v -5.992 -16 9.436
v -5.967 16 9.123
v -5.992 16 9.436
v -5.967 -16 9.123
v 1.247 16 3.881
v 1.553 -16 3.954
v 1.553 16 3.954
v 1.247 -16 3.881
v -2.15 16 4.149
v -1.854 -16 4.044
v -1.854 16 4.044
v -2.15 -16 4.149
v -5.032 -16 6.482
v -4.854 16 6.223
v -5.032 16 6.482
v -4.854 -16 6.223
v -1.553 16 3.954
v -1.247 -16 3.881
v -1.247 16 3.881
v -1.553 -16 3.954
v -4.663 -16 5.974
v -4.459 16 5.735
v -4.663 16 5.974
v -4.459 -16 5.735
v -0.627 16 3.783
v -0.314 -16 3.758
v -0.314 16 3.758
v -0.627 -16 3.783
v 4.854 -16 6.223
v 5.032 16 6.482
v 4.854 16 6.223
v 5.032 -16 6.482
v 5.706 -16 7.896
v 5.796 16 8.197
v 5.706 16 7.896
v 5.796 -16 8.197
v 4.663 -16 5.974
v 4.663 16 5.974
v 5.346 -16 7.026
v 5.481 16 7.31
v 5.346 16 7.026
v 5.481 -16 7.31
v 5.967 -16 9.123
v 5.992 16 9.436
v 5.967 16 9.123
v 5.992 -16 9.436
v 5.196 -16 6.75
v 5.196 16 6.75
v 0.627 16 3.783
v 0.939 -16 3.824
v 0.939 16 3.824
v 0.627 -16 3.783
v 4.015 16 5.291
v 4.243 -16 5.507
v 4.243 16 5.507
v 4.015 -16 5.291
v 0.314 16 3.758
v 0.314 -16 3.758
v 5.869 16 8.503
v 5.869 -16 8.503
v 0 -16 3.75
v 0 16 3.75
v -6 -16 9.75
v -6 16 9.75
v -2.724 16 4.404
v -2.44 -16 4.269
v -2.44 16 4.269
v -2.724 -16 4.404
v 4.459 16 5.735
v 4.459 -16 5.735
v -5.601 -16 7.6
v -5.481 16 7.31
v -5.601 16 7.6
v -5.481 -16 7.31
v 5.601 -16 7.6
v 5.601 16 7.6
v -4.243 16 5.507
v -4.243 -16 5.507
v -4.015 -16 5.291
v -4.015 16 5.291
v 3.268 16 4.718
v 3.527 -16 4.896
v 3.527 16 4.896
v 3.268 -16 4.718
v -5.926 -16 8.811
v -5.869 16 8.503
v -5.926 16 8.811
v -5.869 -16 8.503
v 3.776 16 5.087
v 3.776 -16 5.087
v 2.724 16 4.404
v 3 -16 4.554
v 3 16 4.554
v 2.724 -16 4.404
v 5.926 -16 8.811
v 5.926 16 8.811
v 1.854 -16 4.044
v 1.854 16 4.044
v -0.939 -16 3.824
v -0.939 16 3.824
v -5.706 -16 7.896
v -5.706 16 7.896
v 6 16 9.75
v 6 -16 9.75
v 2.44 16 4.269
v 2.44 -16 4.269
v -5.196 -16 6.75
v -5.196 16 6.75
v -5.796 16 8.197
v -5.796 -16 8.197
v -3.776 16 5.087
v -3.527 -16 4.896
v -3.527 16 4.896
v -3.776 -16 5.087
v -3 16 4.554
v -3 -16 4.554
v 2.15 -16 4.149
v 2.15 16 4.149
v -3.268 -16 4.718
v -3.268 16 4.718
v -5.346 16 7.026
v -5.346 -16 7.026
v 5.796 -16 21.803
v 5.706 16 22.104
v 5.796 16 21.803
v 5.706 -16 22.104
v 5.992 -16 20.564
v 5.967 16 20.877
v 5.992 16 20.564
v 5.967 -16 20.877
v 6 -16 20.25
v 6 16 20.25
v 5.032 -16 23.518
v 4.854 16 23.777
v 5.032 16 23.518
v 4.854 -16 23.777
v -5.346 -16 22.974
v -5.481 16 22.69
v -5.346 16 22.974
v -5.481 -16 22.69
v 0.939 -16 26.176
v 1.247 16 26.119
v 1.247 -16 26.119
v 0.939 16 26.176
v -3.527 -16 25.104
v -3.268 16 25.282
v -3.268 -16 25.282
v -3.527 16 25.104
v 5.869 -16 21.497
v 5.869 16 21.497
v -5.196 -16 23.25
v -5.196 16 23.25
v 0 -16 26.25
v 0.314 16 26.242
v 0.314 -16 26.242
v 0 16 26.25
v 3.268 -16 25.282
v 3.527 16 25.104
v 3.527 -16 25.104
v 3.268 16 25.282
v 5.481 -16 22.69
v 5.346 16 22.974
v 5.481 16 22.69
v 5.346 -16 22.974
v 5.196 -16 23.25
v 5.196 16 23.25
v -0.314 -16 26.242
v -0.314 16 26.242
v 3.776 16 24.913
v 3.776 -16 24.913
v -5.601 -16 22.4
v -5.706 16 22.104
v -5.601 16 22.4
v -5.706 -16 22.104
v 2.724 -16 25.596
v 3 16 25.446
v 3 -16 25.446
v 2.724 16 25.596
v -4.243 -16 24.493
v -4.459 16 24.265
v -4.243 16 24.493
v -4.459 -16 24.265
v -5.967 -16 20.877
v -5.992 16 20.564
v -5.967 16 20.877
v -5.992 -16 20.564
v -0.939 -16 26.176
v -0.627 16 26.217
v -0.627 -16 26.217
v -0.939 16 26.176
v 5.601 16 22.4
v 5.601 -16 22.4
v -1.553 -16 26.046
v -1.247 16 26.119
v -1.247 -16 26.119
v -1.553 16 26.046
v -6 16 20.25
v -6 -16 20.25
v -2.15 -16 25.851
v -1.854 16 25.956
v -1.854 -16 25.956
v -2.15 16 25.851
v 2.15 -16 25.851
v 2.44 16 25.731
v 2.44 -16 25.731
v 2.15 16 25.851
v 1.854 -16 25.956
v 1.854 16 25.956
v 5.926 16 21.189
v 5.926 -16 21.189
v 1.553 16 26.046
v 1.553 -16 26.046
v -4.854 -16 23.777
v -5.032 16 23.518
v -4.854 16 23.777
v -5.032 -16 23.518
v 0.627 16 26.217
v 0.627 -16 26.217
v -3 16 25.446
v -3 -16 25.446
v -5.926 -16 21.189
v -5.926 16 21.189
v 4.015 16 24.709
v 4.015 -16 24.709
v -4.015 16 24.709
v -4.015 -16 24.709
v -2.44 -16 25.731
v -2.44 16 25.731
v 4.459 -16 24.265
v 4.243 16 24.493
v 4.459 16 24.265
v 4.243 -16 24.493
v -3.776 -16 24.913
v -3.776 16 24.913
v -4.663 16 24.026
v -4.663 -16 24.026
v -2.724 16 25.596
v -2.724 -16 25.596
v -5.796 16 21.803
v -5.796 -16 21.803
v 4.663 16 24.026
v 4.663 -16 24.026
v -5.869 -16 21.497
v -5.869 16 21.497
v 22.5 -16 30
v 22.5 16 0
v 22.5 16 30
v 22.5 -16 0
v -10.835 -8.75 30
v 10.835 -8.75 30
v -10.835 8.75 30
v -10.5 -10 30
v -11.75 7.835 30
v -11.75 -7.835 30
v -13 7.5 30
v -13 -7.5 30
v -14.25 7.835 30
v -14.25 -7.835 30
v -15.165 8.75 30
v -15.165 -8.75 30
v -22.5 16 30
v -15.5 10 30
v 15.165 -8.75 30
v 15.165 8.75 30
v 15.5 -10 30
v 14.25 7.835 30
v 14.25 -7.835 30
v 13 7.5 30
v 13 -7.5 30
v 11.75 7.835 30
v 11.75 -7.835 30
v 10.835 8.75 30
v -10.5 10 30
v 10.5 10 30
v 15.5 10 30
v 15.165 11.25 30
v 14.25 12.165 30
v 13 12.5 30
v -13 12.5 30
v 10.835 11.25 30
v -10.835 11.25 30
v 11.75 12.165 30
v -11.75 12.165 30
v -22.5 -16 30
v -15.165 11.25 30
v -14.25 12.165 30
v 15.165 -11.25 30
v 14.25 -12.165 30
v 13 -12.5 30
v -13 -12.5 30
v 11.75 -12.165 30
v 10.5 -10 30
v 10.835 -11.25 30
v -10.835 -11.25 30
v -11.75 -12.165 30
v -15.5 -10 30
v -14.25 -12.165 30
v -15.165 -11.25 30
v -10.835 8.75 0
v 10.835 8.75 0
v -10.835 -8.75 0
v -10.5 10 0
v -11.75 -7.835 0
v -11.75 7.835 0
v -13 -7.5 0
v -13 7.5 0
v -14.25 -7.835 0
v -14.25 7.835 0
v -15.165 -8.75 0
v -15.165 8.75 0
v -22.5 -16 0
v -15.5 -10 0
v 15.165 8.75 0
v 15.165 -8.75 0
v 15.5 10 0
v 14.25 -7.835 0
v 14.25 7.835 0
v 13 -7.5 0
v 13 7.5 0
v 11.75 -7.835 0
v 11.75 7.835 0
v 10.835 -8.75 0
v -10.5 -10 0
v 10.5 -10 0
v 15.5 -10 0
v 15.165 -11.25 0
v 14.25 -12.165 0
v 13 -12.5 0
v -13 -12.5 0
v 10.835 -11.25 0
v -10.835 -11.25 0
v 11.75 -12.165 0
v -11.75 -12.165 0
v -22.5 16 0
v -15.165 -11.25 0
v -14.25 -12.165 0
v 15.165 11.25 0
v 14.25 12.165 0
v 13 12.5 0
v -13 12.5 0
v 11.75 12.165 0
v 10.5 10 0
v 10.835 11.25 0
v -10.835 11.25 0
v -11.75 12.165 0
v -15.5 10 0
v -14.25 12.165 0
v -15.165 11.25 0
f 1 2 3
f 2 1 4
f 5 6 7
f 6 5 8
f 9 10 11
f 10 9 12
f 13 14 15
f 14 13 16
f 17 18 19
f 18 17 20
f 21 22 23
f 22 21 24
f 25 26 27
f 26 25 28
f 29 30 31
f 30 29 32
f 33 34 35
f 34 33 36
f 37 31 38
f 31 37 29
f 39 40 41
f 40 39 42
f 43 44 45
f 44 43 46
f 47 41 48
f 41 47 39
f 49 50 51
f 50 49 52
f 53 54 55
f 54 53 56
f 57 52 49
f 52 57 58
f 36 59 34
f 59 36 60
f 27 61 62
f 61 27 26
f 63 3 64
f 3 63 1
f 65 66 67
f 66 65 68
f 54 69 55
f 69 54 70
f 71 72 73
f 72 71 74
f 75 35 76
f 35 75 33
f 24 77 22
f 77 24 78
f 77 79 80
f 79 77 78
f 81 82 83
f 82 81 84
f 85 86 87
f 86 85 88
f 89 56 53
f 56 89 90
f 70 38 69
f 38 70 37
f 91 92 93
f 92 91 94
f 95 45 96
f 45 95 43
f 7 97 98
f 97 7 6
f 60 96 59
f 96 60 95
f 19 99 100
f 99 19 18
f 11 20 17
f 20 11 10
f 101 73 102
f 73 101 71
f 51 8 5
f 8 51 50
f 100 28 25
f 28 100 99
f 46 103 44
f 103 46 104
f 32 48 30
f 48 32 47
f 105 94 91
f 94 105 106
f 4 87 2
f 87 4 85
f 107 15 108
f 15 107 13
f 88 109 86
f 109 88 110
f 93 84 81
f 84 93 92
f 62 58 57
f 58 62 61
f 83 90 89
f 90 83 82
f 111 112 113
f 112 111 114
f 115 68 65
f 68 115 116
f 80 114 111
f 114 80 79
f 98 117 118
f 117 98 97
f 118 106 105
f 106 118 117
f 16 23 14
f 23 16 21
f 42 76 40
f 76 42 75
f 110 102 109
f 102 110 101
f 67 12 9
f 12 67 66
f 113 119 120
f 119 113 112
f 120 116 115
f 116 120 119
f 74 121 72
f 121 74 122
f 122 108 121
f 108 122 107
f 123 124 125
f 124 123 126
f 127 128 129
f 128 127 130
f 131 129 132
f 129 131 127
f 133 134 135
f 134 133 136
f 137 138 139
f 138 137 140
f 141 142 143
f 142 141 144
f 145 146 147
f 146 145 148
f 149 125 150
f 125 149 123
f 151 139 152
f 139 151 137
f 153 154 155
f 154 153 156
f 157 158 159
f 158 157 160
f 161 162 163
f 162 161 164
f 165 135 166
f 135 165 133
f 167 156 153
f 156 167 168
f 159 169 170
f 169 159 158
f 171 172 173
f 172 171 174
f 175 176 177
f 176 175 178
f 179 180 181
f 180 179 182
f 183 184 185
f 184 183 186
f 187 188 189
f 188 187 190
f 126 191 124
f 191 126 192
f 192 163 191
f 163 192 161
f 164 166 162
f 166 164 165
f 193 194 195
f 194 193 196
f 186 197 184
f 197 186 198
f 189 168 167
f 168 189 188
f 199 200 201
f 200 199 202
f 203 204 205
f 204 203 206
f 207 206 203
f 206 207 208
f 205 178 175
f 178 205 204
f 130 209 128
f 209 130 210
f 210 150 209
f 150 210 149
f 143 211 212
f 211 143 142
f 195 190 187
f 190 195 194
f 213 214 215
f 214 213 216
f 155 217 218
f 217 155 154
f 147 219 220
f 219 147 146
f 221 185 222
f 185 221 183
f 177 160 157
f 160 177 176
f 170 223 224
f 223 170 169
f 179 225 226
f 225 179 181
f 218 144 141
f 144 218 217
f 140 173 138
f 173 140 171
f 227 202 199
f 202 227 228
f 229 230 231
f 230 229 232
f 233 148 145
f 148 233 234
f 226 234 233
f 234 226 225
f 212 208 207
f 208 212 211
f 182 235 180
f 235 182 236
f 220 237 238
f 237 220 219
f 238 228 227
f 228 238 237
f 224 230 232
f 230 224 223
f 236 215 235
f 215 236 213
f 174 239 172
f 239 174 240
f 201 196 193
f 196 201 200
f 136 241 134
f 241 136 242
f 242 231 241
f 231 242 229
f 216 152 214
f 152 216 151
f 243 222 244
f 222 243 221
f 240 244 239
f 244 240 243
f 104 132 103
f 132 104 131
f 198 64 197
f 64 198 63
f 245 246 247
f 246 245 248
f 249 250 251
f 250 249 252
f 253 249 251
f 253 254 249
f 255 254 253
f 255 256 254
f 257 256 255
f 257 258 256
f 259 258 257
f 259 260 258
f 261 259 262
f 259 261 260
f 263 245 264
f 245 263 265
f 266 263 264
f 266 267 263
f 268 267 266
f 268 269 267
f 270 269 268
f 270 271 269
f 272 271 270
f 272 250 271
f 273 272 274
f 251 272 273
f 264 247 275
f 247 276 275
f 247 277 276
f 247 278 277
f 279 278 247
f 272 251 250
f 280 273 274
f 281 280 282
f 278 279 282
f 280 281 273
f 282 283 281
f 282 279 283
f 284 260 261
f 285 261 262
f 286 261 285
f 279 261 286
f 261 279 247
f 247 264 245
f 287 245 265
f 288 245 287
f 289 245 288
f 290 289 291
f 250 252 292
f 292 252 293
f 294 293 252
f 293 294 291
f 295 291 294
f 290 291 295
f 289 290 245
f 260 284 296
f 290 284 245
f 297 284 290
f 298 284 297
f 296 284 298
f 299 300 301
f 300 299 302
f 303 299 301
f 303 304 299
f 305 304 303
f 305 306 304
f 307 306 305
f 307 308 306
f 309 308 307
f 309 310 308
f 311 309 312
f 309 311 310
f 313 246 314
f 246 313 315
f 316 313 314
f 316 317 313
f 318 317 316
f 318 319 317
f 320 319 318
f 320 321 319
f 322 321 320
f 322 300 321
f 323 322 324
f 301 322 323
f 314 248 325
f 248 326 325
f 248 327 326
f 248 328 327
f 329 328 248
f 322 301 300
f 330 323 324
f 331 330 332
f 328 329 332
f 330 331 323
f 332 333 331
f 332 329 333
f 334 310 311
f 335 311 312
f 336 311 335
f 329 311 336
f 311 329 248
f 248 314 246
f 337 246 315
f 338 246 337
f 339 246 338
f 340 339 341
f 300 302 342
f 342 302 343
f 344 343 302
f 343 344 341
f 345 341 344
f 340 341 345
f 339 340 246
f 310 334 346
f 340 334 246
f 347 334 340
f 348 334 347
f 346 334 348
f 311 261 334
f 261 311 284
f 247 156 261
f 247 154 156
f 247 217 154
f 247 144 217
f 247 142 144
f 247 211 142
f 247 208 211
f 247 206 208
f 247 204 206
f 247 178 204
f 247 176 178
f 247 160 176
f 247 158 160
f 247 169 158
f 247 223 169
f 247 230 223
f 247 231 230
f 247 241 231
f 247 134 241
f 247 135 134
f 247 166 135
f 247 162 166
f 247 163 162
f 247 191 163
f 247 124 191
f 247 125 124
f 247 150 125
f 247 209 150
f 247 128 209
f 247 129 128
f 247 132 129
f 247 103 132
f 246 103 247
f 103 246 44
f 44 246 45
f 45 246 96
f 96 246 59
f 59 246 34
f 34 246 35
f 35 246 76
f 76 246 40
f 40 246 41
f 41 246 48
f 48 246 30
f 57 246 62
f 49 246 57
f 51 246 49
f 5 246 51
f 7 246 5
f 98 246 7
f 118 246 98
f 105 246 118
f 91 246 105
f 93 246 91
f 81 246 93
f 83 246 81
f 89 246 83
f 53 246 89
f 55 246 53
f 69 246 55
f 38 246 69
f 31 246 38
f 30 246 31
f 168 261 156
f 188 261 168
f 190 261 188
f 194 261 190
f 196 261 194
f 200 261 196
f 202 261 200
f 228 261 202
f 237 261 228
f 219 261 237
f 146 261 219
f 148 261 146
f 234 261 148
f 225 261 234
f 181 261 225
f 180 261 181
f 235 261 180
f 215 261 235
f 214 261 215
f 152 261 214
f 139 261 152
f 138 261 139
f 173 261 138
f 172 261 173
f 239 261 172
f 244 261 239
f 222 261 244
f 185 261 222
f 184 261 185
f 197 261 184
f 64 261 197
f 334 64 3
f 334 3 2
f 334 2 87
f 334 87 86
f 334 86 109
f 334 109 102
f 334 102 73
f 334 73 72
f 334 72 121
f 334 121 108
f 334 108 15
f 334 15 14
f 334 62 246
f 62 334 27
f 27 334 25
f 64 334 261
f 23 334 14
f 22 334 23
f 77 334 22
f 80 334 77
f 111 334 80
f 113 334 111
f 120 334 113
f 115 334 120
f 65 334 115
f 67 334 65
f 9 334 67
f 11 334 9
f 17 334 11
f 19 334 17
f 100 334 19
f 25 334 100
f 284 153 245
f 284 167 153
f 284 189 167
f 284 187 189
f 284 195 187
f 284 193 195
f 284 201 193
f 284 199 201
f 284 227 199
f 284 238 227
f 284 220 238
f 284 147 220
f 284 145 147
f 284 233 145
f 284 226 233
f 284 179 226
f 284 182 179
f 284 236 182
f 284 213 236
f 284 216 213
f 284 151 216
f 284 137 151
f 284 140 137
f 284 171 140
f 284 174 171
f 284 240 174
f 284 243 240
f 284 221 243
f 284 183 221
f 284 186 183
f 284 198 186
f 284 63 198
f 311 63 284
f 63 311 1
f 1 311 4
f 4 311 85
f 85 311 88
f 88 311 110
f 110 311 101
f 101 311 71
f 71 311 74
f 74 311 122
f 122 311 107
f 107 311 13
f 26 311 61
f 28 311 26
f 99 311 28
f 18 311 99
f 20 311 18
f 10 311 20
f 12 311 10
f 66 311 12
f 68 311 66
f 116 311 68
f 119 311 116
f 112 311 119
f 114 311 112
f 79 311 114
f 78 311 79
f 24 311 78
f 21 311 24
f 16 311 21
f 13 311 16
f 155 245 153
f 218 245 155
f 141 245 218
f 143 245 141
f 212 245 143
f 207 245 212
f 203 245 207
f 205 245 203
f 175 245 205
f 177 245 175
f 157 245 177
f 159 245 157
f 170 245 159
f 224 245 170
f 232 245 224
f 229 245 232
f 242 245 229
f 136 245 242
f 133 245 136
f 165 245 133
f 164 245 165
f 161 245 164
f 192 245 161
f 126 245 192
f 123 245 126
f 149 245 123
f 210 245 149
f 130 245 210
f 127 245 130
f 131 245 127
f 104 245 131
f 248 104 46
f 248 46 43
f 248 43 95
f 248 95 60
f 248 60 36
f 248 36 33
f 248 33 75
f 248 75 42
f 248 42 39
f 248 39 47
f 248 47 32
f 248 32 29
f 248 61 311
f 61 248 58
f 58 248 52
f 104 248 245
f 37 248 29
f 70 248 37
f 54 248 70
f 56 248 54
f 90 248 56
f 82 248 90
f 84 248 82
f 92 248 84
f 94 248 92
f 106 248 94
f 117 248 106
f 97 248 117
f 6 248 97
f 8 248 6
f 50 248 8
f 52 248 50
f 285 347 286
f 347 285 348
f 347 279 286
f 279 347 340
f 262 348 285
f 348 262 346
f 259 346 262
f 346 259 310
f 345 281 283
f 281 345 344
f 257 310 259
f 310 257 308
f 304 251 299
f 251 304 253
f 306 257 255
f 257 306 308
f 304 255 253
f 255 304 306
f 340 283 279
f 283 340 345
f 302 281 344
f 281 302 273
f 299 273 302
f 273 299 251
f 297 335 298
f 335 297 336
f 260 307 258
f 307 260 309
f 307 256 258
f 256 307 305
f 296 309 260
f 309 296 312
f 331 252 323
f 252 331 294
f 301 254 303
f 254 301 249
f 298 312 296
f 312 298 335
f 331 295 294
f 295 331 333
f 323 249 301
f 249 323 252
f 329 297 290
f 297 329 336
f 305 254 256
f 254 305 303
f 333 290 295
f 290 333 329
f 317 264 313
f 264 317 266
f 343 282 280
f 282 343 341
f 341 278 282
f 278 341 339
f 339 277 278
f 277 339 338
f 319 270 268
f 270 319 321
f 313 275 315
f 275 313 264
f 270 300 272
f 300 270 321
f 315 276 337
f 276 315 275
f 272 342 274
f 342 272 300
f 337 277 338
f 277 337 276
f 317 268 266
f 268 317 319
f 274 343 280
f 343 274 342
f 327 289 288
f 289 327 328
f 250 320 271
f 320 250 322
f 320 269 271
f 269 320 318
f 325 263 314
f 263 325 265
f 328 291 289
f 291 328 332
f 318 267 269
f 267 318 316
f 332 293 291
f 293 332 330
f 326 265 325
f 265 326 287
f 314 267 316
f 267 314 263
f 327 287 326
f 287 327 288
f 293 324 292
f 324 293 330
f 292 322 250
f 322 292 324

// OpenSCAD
//
// a slider for Zero Turn Mower servo
// based on a windshield motor
//

thickness   = 30.0;	  	//
width       = 45.0;
depth       = 32.0;

screwDiameter = 5.0;
screwLength = 200.0;
screwX = 10.0;
screwY = 13.0;

rodDiameter = 12.0;
rodHeight = 22.5;



module SliderBody()
{
    translate([0, 0, thickness/2]) {
      cube([width, depth, thickness],center=true);
    }
}

module ScrewHole(dx, dy)
{
    rotate([0, 0, 90]) {	
        translate([dx, dy, -1]) {	
            cylinder(r=screwDiameter/2, h=screwLength, $fn=12);
        }
    }
}

module RodHole(elev)
{
    rotate([90, 0, 0]) {	
        translate([0, elev, -(depth/2 + 5)]) {	
            cylinder(r=rodDiameter/2, h=depth+10, $fn=120);
        }
    }
}

module Rod()
{
    rodRadius = rodDiameter/2;
    midThickness = thickness/2;

    RodHole(midThickness - rodHeight/2 + rodRadius);
    
    RodHole(midThickness + rodHeight/2 - rodRadius);
    
    cubeHeight = rodHeight-rodDiameter;
    
    translate([0,0,midThickness]) {
      cube([rodDiameter,depth+10,cubeHeight],center=true);
    }
}

module Slider()
{
    difference() {

        SliderBody();
        
        ScrewHole(screwX, screwY);
        ScrewHole(-screwX, screwY);
        ScrewHole(screwX, -screwY);
        ScrewHole(-screwX, -screwY);
        
        Rod();
    }
}

Slider();
